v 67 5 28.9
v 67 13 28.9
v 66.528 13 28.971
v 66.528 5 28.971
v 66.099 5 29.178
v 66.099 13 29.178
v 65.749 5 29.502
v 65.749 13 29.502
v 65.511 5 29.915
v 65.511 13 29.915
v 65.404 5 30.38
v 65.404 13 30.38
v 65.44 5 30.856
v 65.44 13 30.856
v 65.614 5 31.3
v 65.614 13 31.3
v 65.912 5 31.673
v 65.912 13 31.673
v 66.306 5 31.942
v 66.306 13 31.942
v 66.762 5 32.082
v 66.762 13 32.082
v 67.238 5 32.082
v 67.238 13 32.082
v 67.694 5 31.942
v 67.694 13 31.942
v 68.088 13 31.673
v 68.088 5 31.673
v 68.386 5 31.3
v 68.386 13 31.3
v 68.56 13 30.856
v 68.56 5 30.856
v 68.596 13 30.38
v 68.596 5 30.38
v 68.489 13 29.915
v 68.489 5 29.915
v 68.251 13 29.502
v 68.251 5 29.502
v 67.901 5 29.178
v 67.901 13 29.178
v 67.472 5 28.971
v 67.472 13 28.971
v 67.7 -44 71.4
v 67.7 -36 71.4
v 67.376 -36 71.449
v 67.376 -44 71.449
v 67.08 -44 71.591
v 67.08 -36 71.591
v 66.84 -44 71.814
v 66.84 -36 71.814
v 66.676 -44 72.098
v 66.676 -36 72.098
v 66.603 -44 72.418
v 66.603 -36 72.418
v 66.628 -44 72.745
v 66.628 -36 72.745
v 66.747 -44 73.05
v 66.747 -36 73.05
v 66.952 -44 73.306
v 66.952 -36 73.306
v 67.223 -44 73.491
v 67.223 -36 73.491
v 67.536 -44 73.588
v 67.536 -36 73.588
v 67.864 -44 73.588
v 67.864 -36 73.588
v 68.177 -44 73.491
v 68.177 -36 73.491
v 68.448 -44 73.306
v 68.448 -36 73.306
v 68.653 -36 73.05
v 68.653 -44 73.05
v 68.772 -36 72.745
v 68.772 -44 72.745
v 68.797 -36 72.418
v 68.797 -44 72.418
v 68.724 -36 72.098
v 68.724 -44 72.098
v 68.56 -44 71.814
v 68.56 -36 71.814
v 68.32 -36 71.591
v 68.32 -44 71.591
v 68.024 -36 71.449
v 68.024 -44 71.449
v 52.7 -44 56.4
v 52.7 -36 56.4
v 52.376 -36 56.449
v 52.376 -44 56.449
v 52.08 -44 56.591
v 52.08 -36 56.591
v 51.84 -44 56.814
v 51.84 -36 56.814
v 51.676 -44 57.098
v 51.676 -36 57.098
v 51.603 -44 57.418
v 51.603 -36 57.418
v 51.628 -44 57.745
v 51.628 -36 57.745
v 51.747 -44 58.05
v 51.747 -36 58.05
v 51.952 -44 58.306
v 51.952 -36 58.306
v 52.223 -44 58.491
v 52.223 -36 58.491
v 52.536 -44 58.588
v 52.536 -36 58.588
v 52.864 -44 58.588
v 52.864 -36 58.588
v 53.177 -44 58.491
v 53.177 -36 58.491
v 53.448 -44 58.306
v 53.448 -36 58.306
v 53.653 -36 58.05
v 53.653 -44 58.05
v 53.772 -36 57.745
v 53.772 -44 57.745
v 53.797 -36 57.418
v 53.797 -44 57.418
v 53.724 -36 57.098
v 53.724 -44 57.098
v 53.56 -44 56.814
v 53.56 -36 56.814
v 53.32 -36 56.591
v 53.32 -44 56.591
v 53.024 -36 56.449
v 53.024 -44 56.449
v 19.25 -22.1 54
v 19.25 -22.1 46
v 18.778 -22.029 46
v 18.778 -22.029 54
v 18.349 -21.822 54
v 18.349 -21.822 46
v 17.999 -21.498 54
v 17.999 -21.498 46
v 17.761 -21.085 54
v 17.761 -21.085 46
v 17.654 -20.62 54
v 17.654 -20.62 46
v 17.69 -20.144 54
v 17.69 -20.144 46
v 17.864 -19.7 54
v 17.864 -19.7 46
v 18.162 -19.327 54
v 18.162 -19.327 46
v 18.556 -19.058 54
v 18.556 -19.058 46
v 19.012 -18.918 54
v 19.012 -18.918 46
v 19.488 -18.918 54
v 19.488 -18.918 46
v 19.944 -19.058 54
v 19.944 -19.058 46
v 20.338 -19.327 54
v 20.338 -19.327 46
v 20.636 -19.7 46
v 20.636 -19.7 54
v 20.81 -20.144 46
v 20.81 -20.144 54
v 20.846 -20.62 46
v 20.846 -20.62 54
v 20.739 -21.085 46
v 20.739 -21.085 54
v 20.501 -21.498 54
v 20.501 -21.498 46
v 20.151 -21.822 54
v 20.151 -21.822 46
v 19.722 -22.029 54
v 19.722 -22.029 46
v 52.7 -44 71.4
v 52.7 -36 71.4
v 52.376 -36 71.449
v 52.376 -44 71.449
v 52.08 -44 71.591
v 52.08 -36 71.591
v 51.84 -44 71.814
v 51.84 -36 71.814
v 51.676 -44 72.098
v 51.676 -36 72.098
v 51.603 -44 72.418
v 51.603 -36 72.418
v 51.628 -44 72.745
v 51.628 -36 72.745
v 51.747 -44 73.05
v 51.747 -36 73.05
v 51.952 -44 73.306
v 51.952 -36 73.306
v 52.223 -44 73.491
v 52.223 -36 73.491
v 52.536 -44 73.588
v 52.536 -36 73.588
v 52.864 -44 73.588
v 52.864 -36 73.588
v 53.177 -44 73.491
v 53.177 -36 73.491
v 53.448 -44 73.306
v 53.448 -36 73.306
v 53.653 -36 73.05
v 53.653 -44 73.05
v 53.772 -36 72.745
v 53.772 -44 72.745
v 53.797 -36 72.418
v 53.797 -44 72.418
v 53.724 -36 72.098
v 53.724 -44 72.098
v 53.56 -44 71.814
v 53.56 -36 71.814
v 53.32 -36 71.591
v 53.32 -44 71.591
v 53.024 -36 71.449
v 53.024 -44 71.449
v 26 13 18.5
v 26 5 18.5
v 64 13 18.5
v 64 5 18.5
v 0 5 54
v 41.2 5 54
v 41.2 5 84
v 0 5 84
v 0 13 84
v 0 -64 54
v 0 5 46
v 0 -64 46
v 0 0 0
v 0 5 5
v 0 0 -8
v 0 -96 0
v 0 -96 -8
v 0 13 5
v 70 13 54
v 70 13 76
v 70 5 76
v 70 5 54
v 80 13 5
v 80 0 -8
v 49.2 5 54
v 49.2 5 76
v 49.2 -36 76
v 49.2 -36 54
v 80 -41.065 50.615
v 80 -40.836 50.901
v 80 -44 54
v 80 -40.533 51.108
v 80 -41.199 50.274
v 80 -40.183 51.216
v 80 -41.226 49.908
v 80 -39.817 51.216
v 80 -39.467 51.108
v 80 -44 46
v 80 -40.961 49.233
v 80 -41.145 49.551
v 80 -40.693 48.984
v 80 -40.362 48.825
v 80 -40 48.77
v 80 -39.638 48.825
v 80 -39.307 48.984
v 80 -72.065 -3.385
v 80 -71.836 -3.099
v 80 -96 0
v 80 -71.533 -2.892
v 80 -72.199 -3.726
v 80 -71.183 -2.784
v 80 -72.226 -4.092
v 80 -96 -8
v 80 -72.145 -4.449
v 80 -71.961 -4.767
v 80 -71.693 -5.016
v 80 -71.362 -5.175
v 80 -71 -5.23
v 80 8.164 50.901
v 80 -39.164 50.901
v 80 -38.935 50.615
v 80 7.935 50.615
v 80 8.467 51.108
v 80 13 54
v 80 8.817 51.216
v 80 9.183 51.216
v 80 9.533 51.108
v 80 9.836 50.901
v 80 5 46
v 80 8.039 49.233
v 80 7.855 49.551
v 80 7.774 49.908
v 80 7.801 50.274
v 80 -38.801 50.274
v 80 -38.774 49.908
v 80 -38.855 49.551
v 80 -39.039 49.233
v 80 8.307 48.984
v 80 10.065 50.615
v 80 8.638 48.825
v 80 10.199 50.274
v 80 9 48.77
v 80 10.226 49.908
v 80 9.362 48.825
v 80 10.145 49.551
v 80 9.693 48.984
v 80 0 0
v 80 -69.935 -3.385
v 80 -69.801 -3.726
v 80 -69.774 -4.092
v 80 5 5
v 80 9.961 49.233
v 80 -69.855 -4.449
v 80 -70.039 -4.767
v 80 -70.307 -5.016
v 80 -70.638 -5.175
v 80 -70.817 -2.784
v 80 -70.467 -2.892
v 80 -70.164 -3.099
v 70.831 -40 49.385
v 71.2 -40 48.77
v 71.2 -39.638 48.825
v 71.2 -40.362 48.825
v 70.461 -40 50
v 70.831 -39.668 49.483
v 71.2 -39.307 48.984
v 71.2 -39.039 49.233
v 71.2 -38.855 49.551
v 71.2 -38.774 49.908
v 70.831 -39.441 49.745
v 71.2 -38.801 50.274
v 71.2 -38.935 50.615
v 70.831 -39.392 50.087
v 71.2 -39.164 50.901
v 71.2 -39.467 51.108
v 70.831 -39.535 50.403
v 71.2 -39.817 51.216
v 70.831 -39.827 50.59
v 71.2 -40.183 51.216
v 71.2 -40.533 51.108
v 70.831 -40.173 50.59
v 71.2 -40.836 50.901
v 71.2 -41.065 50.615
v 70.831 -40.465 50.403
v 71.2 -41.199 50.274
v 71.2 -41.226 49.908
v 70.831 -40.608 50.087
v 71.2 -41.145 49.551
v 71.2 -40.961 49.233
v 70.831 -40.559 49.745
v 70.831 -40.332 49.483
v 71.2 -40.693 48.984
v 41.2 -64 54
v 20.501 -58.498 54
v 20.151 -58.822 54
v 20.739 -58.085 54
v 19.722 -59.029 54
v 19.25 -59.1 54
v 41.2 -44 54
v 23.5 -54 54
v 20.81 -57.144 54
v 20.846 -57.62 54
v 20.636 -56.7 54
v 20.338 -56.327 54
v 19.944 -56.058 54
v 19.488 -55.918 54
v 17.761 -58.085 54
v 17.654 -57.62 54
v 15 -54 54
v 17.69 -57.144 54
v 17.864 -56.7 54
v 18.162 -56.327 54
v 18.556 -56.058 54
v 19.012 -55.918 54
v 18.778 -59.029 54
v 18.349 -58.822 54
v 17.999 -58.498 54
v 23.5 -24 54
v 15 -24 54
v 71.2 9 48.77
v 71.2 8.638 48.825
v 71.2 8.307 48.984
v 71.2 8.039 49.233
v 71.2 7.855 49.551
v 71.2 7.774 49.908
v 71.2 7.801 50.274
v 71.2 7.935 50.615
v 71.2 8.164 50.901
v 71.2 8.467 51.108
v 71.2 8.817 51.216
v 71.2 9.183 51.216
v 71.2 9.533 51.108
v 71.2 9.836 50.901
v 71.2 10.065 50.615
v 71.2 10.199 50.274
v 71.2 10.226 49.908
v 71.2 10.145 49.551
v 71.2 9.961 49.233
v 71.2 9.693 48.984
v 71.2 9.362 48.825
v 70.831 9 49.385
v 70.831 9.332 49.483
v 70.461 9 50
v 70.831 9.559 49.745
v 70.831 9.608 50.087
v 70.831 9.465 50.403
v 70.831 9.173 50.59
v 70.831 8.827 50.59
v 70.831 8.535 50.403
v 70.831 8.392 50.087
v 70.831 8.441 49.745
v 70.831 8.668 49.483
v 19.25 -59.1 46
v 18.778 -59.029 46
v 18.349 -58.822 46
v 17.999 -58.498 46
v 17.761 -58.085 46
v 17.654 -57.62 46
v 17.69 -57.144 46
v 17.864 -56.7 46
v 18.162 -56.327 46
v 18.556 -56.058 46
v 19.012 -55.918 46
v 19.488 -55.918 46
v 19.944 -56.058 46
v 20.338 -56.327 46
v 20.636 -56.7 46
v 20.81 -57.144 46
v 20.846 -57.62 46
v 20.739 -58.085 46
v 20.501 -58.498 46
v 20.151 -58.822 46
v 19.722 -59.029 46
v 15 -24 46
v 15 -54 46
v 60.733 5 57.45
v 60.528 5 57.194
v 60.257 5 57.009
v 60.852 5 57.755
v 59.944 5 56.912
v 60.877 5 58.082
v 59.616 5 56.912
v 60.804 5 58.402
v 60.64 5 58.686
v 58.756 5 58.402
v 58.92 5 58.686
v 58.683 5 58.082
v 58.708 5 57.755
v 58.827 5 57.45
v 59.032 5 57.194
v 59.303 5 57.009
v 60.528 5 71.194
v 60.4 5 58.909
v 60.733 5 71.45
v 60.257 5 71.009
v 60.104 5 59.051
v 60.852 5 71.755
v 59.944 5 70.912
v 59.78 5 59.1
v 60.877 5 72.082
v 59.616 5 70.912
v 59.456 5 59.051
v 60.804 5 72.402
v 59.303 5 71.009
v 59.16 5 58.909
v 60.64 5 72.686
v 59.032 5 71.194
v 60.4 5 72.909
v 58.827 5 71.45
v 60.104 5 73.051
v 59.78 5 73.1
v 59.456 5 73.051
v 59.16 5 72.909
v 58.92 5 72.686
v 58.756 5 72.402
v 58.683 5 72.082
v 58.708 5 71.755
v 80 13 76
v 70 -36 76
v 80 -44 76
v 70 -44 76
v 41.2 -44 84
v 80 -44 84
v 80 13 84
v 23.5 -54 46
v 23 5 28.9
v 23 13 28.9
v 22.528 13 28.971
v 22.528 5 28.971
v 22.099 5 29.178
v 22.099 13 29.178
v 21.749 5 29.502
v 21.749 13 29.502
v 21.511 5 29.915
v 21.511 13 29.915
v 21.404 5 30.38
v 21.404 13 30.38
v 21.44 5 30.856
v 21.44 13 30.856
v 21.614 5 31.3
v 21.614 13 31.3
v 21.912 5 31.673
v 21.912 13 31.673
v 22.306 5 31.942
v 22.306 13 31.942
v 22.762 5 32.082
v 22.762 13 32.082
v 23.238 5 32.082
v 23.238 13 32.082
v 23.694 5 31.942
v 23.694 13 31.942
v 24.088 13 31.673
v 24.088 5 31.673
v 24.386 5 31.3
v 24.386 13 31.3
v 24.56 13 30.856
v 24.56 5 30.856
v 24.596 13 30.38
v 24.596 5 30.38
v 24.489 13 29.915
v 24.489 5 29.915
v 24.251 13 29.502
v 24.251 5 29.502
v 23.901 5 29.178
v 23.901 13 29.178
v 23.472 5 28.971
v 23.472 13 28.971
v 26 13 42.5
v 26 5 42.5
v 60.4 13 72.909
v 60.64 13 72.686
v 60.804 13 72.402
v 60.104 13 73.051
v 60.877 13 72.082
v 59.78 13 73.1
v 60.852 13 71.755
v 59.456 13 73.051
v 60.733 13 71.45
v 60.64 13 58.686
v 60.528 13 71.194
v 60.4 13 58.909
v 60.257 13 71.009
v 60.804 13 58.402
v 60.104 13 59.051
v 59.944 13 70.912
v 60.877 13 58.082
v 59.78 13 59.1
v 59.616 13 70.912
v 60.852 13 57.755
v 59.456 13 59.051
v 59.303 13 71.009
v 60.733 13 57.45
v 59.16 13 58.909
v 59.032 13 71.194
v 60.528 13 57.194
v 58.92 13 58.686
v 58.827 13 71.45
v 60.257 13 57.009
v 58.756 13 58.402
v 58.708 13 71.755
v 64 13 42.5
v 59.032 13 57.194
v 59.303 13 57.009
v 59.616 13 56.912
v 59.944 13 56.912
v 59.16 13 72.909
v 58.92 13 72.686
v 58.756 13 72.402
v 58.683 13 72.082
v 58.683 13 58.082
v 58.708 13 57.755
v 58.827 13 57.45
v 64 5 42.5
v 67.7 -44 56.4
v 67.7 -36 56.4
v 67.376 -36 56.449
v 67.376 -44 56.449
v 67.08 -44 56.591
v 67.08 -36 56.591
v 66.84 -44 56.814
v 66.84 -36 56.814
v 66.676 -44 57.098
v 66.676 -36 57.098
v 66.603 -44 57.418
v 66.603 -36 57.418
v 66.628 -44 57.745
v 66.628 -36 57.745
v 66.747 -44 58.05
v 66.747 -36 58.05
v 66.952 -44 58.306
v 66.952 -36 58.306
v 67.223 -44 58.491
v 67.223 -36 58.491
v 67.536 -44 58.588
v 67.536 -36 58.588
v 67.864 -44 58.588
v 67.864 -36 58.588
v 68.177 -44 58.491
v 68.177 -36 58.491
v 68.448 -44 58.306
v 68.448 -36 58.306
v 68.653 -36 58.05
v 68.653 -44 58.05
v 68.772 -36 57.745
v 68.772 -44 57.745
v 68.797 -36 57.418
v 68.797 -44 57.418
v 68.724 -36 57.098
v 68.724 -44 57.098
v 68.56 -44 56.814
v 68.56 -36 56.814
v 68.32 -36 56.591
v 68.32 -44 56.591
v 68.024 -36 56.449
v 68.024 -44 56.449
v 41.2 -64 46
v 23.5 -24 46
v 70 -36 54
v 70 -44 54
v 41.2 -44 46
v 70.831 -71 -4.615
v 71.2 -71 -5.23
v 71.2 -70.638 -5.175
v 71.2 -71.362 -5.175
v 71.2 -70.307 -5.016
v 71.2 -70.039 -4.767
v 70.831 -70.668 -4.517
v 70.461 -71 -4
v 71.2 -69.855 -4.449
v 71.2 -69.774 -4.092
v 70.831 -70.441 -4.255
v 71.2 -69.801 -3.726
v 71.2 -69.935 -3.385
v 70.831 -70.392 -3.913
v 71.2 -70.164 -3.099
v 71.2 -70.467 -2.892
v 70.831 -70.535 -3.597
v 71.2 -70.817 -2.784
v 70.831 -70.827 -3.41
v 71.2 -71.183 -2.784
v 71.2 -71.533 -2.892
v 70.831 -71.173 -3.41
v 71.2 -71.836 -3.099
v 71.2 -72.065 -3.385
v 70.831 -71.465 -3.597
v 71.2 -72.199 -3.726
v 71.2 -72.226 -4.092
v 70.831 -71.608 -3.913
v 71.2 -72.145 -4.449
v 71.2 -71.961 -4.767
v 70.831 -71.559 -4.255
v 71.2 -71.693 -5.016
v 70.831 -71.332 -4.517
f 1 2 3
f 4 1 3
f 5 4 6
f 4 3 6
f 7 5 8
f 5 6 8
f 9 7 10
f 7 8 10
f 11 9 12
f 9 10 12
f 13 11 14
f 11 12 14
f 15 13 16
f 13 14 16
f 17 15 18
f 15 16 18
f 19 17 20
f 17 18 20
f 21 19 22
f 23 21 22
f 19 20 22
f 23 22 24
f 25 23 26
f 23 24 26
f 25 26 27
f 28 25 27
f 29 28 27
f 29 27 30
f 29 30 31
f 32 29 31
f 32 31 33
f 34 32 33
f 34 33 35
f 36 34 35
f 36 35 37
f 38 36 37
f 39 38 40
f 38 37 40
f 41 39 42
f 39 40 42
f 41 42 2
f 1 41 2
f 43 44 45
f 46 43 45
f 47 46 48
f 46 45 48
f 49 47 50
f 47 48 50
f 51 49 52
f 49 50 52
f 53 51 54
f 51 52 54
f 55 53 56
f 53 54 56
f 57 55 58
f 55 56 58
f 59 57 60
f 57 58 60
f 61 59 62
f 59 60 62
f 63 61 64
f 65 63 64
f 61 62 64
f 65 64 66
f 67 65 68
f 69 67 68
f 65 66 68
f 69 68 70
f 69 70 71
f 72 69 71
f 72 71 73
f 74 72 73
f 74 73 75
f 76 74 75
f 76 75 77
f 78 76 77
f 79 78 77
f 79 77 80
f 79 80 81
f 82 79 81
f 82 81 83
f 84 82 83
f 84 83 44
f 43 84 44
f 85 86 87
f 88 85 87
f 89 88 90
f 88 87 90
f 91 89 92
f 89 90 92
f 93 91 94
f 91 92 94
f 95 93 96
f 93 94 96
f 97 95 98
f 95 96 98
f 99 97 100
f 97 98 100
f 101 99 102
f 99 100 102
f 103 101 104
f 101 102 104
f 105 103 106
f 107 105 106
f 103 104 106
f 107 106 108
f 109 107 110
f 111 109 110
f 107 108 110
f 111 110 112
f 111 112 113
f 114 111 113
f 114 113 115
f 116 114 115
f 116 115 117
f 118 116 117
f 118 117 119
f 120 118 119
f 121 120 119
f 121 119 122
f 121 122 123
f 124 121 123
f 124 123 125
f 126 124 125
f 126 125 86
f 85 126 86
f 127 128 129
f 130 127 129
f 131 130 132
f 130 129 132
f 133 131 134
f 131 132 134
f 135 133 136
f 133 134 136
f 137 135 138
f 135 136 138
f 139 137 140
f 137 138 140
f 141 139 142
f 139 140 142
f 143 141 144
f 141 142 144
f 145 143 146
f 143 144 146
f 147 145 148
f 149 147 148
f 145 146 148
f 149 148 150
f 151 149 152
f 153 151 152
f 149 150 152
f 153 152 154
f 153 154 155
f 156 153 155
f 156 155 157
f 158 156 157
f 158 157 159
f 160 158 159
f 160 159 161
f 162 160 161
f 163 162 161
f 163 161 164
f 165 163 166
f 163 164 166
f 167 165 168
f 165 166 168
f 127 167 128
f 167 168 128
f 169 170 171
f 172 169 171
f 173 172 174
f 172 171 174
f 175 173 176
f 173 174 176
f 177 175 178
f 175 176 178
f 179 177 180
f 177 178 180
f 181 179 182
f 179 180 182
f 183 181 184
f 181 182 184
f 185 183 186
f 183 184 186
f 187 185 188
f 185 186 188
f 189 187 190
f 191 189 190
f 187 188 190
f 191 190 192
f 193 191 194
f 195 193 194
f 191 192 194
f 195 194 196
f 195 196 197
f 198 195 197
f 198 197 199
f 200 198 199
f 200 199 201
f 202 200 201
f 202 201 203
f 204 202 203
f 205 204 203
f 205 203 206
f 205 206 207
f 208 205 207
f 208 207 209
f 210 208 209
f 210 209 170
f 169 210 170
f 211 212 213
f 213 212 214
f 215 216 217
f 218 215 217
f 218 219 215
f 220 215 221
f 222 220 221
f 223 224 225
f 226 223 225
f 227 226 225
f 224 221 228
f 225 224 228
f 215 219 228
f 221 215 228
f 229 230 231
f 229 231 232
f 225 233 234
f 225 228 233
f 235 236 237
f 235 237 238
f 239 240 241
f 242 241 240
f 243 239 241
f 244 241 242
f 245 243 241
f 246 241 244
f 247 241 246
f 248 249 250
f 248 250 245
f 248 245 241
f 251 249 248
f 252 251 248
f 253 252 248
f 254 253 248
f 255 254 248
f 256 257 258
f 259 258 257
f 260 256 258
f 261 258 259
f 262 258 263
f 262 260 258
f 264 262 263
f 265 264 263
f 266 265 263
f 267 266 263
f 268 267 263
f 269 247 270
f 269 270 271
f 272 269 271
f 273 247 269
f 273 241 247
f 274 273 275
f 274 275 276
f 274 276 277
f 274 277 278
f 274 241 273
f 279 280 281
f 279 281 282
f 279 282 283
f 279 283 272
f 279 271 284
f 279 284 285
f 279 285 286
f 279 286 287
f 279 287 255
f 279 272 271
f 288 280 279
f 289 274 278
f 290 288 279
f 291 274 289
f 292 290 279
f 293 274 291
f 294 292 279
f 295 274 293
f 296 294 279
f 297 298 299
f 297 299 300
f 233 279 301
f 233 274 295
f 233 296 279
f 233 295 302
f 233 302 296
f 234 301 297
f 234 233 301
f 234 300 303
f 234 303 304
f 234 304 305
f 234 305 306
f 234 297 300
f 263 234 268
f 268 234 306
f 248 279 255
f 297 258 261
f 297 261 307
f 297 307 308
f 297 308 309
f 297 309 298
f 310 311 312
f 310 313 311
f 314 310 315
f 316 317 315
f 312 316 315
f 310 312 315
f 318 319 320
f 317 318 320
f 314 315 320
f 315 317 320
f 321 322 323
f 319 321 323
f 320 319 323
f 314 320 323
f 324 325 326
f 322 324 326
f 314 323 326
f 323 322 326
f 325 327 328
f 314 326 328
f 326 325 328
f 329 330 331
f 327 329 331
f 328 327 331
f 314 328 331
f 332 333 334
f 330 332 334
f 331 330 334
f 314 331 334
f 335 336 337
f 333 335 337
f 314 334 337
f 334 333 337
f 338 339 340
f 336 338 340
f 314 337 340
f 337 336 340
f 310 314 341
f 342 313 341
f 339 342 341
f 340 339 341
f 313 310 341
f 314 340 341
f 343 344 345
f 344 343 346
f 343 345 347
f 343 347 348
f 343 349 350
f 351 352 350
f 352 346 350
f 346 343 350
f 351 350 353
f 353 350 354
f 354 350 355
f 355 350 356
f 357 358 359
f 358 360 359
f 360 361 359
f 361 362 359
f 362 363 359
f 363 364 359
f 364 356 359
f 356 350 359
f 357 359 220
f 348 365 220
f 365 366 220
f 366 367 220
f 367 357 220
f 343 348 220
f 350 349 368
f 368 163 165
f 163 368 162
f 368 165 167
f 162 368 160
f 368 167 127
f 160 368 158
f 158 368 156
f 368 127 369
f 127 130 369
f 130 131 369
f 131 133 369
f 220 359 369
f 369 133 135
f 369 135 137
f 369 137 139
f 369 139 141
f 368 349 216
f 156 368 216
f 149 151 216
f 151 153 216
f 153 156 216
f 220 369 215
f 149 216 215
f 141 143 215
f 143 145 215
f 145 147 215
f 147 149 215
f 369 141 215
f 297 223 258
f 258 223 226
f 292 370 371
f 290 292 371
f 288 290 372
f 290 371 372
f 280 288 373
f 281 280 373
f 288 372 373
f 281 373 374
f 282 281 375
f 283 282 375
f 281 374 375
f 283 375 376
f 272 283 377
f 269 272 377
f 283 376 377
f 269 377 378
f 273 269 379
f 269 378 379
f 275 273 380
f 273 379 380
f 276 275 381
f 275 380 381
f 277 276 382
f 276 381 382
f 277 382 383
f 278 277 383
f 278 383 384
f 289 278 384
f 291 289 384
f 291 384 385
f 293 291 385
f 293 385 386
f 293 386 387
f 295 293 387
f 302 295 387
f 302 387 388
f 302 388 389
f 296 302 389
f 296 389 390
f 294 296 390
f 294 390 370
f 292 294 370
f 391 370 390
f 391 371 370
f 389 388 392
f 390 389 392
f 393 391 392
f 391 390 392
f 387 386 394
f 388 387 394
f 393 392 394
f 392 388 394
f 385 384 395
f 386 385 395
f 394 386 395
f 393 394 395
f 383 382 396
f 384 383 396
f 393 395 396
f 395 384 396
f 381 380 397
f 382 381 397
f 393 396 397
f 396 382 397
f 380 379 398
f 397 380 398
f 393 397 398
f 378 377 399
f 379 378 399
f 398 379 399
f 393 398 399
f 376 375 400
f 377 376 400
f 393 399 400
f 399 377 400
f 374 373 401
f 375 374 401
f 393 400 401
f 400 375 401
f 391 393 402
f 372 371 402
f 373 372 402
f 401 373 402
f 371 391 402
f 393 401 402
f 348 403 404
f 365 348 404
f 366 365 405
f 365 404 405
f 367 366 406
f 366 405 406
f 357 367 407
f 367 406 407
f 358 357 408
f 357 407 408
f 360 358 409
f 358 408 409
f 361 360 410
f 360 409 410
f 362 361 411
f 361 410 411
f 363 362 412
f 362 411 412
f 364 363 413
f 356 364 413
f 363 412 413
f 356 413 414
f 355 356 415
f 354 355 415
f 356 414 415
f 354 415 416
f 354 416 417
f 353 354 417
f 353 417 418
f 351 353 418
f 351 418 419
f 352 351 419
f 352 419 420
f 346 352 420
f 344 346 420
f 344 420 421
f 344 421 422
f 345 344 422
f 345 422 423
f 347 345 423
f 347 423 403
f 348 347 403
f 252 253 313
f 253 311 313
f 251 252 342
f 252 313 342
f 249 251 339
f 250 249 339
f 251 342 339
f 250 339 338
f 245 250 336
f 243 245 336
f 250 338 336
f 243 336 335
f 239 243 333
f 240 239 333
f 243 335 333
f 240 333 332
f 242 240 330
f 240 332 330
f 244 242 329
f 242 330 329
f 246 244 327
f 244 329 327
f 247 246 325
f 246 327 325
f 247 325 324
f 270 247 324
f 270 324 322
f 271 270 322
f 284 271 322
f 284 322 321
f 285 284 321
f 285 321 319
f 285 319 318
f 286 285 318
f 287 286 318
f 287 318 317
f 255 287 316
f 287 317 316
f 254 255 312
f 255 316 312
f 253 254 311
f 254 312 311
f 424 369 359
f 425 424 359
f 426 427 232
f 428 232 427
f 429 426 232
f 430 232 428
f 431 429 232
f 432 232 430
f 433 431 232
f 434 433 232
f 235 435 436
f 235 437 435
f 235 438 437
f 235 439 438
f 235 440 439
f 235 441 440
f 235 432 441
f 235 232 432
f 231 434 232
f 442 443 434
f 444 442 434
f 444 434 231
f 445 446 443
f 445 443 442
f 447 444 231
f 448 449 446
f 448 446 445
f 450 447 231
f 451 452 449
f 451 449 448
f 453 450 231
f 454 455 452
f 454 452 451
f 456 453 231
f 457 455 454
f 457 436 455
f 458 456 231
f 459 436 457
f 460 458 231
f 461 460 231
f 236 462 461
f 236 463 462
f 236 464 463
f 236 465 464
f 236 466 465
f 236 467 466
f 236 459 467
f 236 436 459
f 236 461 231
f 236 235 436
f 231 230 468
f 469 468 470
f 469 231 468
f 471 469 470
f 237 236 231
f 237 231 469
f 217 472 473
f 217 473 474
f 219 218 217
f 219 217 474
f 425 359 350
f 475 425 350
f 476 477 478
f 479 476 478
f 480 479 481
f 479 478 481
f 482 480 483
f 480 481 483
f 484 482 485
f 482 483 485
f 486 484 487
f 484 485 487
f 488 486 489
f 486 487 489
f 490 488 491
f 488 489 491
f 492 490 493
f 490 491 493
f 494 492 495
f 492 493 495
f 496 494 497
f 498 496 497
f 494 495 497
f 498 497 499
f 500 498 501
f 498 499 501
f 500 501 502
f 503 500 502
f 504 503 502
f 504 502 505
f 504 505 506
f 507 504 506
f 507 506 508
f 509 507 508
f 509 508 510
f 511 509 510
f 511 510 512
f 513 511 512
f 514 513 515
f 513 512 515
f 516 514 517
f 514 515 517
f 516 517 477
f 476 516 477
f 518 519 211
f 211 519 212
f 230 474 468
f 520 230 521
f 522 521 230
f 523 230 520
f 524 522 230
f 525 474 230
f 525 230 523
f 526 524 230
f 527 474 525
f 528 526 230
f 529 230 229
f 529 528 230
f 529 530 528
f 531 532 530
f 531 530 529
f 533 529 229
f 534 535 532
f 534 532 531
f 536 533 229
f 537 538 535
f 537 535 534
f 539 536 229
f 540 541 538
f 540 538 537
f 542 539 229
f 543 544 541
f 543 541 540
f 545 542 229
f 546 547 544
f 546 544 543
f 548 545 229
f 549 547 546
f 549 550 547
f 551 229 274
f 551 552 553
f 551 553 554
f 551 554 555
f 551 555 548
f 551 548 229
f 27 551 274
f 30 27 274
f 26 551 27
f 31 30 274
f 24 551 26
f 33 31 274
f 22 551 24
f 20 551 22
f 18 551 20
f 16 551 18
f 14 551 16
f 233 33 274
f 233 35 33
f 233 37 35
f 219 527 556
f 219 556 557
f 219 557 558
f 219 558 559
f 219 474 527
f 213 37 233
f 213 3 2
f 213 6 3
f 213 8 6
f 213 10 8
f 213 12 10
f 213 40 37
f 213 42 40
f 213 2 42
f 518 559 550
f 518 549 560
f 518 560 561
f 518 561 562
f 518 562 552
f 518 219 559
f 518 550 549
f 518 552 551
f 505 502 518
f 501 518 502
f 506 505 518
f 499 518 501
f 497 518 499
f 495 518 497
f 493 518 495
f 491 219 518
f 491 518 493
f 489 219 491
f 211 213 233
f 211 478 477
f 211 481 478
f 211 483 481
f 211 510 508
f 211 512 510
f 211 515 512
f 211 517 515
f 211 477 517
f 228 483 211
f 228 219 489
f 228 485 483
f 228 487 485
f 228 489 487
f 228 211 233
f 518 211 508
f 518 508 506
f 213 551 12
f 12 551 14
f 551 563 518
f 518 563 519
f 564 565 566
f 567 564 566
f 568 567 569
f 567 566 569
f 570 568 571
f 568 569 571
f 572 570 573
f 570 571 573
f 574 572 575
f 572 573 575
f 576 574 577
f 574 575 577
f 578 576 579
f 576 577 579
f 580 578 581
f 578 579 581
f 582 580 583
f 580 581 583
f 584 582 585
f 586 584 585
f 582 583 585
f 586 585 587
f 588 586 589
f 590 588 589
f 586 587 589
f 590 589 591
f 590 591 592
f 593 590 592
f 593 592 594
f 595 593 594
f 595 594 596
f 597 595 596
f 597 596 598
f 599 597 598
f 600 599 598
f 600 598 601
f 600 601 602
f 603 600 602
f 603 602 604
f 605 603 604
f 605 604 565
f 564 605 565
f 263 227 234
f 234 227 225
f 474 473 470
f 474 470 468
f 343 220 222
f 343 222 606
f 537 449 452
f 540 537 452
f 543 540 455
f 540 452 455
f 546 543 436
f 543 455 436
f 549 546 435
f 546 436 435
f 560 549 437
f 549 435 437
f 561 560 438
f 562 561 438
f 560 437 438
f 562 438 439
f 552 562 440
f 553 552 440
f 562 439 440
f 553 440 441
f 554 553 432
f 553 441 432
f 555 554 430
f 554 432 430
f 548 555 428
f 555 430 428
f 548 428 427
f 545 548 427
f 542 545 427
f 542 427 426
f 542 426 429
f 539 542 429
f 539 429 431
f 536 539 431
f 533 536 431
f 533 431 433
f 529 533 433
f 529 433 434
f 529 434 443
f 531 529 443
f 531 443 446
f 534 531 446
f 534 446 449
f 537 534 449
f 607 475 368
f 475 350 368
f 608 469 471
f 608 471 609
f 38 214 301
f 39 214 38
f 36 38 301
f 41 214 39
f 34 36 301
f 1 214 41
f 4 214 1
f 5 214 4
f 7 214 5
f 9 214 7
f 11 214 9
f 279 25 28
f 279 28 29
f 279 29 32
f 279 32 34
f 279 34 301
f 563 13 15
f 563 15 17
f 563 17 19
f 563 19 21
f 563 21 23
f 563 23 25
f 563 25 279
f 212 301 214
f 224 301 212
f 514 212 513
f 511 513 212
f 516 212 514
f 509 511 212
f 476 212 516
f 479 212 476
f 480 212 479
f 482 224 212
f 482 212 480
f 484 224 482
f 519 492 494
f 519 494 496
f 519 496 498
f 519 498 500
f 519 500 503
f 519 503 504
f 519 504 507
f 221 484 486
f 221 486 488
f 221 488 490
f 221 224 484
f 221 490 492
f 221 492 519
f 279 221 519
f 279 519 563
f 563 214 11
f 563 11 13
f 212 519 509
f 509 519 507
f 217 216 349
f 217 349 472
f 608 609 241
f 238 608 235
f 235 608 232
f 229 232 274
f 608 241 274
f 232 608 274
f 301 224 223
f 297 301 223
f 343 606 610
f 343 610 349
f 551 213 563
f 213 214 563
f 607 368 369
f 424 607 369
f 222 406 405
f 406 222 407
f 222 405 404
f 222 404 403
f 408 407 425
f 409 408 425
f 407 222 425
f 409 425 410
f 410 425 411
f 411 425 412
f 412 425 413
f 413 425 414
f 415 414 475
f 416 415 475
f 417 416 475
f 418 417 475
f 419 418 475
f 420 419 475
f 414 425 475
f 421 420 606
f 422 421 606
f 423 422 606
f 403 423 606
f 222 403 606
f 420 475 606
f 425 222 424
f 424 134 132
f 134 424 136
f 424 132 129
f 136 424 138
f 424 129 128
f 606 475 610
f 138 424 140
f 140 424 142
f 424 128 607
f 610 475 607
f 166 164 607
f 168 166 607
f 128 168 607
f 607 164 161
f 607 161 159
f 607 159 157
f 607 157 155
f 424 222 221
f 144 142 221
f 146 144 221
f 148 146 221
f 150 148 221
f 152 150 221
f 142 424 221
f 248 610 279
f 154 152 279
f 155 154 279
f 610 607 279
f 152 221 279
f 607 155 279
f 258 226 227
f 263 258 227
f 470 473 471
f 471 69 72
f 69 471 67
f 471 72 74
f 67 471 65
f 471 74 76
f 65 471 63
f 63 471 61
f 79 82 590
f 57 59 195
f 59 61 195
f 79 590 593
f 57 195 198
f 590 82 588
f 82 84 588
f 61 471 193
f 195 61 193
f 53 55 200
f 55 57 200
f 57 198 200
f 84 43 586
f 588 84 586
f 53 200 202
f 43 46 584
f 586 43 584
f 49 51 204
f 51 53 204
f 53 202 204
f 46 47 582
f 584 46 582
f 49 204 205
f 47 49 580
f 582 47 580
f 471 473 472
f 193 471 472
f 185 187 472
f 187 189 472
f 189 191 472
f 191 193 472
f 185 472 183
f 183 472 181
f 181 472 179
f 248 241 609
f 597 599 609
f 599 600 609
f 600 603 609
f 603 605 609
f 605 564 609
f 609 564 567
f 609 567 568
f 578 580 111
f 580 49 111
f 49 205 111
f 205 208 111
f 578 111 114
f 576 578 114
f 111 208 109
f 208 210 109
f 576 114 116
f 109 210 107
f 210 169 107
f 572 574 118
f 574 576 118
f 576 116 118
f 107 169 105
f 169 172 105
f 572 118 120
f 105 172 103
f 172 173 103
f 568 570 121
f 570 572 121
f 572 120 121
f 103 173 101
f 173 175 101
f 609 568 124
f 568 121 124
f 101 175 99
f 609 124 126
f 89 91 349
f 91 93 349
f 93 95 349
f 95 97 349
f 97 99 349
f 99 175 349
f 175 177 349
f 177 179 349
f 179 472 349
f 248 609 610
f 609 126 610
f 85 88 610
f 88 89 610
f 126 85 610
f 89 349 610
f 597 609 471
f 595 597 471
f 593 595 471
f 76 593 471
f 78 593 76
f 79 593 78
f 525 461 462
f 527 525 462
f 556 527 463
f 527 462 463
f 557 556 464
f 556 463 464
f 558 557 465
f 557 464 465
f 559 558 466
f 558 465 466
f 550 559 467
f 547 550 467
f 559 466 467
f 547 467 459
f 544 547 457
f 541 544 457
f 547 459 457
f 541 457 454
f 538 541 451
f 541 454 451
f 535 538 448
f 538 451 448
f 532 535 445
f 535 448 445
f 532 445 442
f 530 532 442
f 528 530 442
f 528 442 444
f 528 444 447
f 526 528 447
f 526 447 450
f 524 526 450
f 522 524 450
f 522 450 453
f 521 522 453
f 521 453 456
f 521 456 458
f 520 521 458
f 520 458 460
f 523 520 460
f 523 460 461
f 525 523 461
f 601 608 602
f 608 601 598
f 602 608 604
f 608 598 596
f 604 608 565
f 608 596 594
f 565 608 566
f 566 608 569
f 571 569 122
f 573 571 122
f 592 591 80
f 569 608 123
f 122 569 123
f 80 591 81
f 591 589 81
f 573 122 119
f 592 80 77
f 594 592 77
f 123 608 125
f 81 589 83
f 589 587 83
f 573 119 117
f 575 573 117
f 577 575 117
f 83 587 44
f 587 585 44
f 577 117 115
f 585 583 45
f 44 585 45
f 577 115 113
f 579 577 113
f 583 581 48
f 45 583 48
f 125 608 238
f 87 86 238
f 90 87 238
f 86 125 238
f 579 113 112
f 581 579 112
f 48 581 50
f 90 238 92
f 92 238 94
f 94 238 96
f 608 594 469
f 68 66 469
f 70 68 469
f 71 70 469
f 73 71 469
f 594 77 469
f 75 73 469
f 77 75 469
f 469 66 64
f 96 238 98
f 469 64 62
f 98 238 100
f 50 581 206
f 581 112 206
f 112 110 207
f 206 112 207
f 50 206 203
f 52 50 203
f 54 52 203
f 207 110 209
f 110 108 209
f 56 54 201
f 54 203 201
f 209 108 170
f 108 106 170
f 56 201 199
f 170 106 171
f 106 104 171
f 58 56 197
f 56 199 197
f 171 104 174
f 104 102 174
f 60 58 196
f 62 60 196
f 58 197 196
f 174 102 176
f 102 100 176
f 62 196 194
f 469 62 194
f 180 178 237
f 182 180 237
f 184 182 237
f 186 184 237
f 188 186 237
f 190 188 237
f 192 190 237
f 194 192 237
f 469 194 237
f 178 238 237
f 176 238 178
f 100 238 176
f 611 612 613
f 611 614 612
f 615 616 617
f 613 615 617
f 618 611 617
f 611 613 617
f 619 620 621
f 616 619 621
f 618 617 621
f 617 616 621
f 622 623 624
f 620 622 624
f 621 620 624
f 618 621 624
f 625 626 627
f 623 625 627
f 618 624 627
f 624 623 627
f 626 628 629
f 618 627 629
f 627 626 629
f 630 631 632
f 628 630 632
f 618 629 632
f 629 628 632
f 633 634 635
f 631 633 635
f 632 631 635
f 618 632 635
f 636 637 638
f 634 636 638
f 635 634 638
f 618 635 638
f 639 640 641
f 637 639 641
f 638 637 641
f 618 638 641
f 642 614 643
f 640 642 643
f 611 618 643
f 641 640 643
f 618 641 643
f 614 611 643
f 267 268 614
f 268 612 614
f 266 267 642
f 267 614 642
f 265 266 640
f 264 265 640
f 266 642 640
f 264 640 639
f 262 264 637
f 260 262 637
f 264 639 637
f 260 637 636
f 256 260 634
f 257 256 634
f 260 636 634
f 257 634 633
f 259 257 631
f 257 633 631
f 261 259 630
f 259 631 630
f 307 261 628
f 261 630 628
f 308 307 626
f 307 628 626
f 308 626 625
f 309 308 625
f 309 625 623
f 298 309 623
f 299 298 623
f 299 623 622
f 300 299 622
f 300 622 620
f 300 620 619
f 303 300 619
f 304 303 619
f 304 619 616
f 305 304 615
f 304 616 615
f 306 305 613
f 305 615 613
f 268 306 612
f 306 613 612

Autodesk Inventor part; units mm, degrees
ref_plane "YZ Plane" through (0, 0, 0) normal (1, 0, 0) x (0, 1, 0)
ref_plane "XZ Plane" through (0, 0, 0) normal (0, 1, 0) x (-1, 0, 0)
ref_plane "XY Plane" through (0, 0, 0) normal (0, 0, 1) x (1, 0, 0)
sketch "スケッチ1" plane through (0, 0, 0) normal (1, 0, 0) x (0, 1, 0)
  line L0 (0, 0) -> (-96, 0)
  line L1 (-96, 0) -> (-96, -8)
  line L2 (-96, -8) -> (0, -8)
  line L3 (0, -8) -> (0, 0)
  line L4 (13, 5) -> (5, 5)
  line L5 (5, 5) -> (5, 75)
  line L6 (5, 75) -> (13, 75)
  line L7 (13, 75) -> (13, 5)
  line L8 (13, 5) -> (0, -8)
  line L9 (5, 5) -> (0, 0)
  line L10 (-44, 84) -> (13, 84)
  line L11 (13, 84) -> (13, 75)
  line L12 (-44, 76) -> (-44, 46)
  line L13 (-44, 46) -> (-36, 46)
  line L14 (-36, 46) -> (-36, 76)
  line L15 (5, 75) -> (5, 76)
  line L16 (5, 76) -> (-44, 76)
  line L17 (-44, 84) -> (-44, 76)
  point P0 (-36, 0)
  point P1 (-36, 76)
  point P2 (-44, 76)
  dimension "d0" = 8
  dimension "d2" = 8
  dimension "d3" = 70
  dimension "d4" = 96
  dimension "d17" = 13
  dimension "d36" = 8
  dimension "d37" = 41
  dimension "d53" = 1
  dimension "d54" = 8
  dimension "d55" = 30
  dimension "d72" = 57
  dimension "d86" = 30
extrude "押し出し1" add sketch "スケッチ1" along normal blind 80
sketch "スケッチ2" plane through (80, 0, 0) normal (1, 0, 0) x (0, 0, -1)
  line L0 (8, -96) -> (8, 0) projected
  point P0 (0, 0)
  point P1 (4, -71)
  point P2 (-50, 9)
  point P3 (-50, -40)
  dimension "d9" = 4
  dimension "d19" = 80
  dimension "d84" = 58
  dimension "d87" = 49
hole "穴1" at (80, -71, -4) at (80, 9, 50) at (80, -40, 50) direction (-1, 0, 0) diameter 2.459 depth 8.8 tip angle 118 thread size "M3x0.5" class "6H" standard "ISO Metric profile"
sketch "スケッチ5" plane through (0, 13, 84) normal (0, 1, 0) x (1, 0, 0)
  line L0 (80, 8) -> (70, 8)
  line L1 (70, 8) -> (70, 30)
  line L2 (70, 30) -> (80, 30)
  line L3 (80, 30) -> (80, 8)
  line L4 (0, 0) -> (80, 0) projected
  line L5 (80, 79) -> (80, 0) projected
  point P0 (0, 84)
  dimension "d38" = 8
  dimension "d39" = 10
  dimension "d40" = 22
extrude "押し出し3" cut sketch "スケッチ5" against normal blind 80
sketch "スケッチ6" plane through (0, 13, 84) normal (0, 1, 0) x (1, 0, 0)
  line L0 (80, 8) -> (80, 0) projected
  line L1 (0, 0) -> (80, 0) projected
  point P0 (0, 84)
  point P1 (59.78, 12)
  point P2 (59.78, 26)
  dimension "d43" = 20.22
  dimension "d44" = 12
  dimension "d45" = 14
hole "穴3" at (59.78, 13, 72) at (59.78, 13, 58) direction (0, -1, 0) diameter 2.2 depth 8.8 tip angle 118
sketch "スケッチ7" plane through (0, -44, 46) normal (0, -1, 0) x (1, 0, 0)
  line L0 (80, 8) -> (80, 0) projected
  line L1 (80, 8) -> (70, 8) projected
  point P0 (0, -46)
  point P1 (67.7, 26.5)
  point P2 (67.7, 11.5)
  point P3 (52.7, 26.5)
  point P4 (52.7, 11.5)
  dimension "d58" = 15
  dimension "d59" = 15
  dimension "d60" = 12.3
  dimension "d61" = 3.5
hole "穴4" at (67.7, -44, 72.5) at (67.7, -44, 57.5) at (52.7, -44, 72.5) at (52.7, -44, 57.5) direction (0, 1, 0) diameter 2.2 depth 8 tip angle 118
sketch "スケッチ8" plane through (0, -44, 46) normal (0, -1, 0) x (1, 0, 0)
  line L0 (0, 38) -> (41.2, 38)
  line L1 (41.2, 38) -> (41.2, 8)
  line L2 (41.2, 8) -> (0, 8)
  line L3 (0, 8) -> (0, 38)
  line L4 (0, -46) -> (80, -46) projected
  line L5 (0, 38) -> (0, -46) projected
  line L6 (0, 38) -> (80, 38) projected
  circle A0 centre (52.7, 26.5) radius 1.1 projected
  line L7 (80, 8) -> (70, 8) projected
  dimension "d75" = 11.5
  dimension "d83" = 0
extrude "押し出し4" cut sketch "スケッチ8" against normal blind 10 contours L0 L1 L2 L3
sketch "スケッチ9" plane through (0, -34, 46) normal (0, -1, 0) x (1, 0, 0)
  point P0 (0, -46)
sketch "スケッチ10" plane through (0, -34, 46) normal (0, -1, 0) x (1, 0, 0)
  line L0 (41.2, 38) -> (0, 38)
  line L1 (0, 38) -> (0, 30)
  line L2 (0, 30) -> (41.2, 30)
  line L3 (41.2, 30) -> (41.2, 38)
  line L4 (0, 38) -> (41.2, 38) projected
  line L5 (41.2, 38) -> (41.2, 8) projected
  line L6 (0, 30) -> (0, 38) projected
  line L7 (41.2, 30) -> (0, 30) projected
  point P0 (0, -46)
  point P1 (41.2, 0)
extrude "押し出し5" cut sketch "スケッチ10" against normal blind 39
sketch "スケッチ11" plane through (0, 5, 5) normal (0, -1, 0) x (1, 0, 0)
  point P0 (0, -5)
sketch "スケッチ12" plane through (0, 5, 5) normal (0, -1, 0) x (1, 0, 0)
  line L0 (41.2, 71) -> (49.2, 71)
  line L1 (49.2, 71) -> (49.2, 49)
  line L2 (49.2, 49) -> (41.2, 49)
  line L3 (41.2, 49) -> (41.2, 71)
  point P0 (0, -5)
  point P1 (70, 71)
  point P2 (41.2, 71)
  dimension "d76" = 8
  dimension "d77" = 22
extrude "押し出し6" add sketch "スケッチ12" along normal blind 49
sketch "スケッチ13" plane through (80, 0, 0) normal (1, 0, 0) x (0, 0, -1)
  line L0 (-54, 5) -> (-46, 5)
  line L1 (-46, 5) -> (-46, -36)
  line L2 (-46, -36) -> (-54, -36)
  line L3 (-54, -36) -> (-54, 5)
  line L4 (-54, 5) -> (-5, 5) projected
  line L5 (-46, -36) -> (-54, -36) projected
  line L6 (-54, 5) -> (-54, -36) projected
  line L7 (-46, -44) -> (-46, -36) projected
  point P0 (0, 0)
extrude "押し出し7" add sketch "スケッチ13" against normal blind 80
sketch "スケッチ14" plane through (0, 5, 46) normal (0, -1, 0) x (1, 0, 0)
  line L0 (70, -0.5) -> (20, -0.5)
  line L1 (20, -0.5) -> (20, -30.5)
  line L2 (20, -30.5) -> (70, -30.5)
  line L3 (70, -30.5) -> (70, -0.5)
  line L4 (0, -41) -> (0, 0) projected
  line L5 (0, 0) -> (80, 0) projected
  line L6 (64, -3.5) -> (26, -3.5)
  line L7 (26, -3.5) -> (26, -27.5)
  line L8 (26, -27.5) -> (64, -27.5)
  line L9 (64, -27.5) -> (64, -3.5)
  point P0 (0, -46)
  point P1 (0, -20.5)
  point P2 (67, -15.5)
  point P3 (23, -15.5)
  dimension "d88" = 20
  dimension "d89" = 30
  dimension "d90" = 50
  dimension "d91" = 0.5
  dimension "d92" = 6
  dimension "d93" = 6
  dimension "d94" = 3
  dimension "d95" = 3
  dimension "d98" = 44
  dimension "d99" = 3
extrude "押し出し8" cut sketch "スケッチ14" against normal blind 10 contours L9 L8 L7 L6
hole "穴5" at (67, 5, 30.5) at (23, 5, 30.5) direction (0, 1, 0) diameter 3.2 depth 8.8 tip angle 118
sketch "スケッチ15" plane through (0, -44, 46) normal (0, -1, 0) x (1, 0, 0)
  point P0 (0, -46)
sketch "スケッチ16" plane through (0, -44, 46) normal (0, -1, 0) x (1, 0, 0)
  line L0 (0, 0) -> (41.2, 0)
  line L1 (41.2, 0) -> (41.2, 8)
  line L2 (41.2, 8) -> (0, 8)
  line L3 (0, 8) -> (0, 0)
  point P0 (0, -46)
  dimension "d107" = 8
  dimension "d108" = 41.2
extrude "押し出し9" add sketch "スケッチ16" along normal blind 20
sketch "スケッチ20" plane through (0, 5, 54) normal (0, 0, 1) x (1, 0, 0)
  line L0 (15, -59) -> (23.5, -59)
  line L1 (23.5, -59) -> (23.5, -29)
  line L2 (23.5, -29) -> (15, -29)
  line L3 (15, -29) -> (15, -59)
  line L4 (41.2, -69) -> (0, -69) projected
  line L5 (0, -69) -> (0, 0) projected
  point P0 (0, -5)
  point P1 (19.25, -62.5)
  point P2 (19.25, -25.5)
  point P3 (23.5, -44)
  point P4 (19.25, -29)
  dimension "d111" = 10
  dimension "d112" = 30
  dimension "d113" = 37
  dimension "d114" = 8.5
  dimension "d115" = 15
  dimension "d116" = 18.5
extrude "押し出し10" cut sketch "スケッチ20" against normal blind 20
hole "穴6" at (19.25, -57.5, 54) at (19.25, -20.5, 54) direction (0, 0, -1) diameter 3.2 depth 8.8 tip angle 118
equation "\"d116\" = 0.5 * d113"
properties part number "左仕切り"
